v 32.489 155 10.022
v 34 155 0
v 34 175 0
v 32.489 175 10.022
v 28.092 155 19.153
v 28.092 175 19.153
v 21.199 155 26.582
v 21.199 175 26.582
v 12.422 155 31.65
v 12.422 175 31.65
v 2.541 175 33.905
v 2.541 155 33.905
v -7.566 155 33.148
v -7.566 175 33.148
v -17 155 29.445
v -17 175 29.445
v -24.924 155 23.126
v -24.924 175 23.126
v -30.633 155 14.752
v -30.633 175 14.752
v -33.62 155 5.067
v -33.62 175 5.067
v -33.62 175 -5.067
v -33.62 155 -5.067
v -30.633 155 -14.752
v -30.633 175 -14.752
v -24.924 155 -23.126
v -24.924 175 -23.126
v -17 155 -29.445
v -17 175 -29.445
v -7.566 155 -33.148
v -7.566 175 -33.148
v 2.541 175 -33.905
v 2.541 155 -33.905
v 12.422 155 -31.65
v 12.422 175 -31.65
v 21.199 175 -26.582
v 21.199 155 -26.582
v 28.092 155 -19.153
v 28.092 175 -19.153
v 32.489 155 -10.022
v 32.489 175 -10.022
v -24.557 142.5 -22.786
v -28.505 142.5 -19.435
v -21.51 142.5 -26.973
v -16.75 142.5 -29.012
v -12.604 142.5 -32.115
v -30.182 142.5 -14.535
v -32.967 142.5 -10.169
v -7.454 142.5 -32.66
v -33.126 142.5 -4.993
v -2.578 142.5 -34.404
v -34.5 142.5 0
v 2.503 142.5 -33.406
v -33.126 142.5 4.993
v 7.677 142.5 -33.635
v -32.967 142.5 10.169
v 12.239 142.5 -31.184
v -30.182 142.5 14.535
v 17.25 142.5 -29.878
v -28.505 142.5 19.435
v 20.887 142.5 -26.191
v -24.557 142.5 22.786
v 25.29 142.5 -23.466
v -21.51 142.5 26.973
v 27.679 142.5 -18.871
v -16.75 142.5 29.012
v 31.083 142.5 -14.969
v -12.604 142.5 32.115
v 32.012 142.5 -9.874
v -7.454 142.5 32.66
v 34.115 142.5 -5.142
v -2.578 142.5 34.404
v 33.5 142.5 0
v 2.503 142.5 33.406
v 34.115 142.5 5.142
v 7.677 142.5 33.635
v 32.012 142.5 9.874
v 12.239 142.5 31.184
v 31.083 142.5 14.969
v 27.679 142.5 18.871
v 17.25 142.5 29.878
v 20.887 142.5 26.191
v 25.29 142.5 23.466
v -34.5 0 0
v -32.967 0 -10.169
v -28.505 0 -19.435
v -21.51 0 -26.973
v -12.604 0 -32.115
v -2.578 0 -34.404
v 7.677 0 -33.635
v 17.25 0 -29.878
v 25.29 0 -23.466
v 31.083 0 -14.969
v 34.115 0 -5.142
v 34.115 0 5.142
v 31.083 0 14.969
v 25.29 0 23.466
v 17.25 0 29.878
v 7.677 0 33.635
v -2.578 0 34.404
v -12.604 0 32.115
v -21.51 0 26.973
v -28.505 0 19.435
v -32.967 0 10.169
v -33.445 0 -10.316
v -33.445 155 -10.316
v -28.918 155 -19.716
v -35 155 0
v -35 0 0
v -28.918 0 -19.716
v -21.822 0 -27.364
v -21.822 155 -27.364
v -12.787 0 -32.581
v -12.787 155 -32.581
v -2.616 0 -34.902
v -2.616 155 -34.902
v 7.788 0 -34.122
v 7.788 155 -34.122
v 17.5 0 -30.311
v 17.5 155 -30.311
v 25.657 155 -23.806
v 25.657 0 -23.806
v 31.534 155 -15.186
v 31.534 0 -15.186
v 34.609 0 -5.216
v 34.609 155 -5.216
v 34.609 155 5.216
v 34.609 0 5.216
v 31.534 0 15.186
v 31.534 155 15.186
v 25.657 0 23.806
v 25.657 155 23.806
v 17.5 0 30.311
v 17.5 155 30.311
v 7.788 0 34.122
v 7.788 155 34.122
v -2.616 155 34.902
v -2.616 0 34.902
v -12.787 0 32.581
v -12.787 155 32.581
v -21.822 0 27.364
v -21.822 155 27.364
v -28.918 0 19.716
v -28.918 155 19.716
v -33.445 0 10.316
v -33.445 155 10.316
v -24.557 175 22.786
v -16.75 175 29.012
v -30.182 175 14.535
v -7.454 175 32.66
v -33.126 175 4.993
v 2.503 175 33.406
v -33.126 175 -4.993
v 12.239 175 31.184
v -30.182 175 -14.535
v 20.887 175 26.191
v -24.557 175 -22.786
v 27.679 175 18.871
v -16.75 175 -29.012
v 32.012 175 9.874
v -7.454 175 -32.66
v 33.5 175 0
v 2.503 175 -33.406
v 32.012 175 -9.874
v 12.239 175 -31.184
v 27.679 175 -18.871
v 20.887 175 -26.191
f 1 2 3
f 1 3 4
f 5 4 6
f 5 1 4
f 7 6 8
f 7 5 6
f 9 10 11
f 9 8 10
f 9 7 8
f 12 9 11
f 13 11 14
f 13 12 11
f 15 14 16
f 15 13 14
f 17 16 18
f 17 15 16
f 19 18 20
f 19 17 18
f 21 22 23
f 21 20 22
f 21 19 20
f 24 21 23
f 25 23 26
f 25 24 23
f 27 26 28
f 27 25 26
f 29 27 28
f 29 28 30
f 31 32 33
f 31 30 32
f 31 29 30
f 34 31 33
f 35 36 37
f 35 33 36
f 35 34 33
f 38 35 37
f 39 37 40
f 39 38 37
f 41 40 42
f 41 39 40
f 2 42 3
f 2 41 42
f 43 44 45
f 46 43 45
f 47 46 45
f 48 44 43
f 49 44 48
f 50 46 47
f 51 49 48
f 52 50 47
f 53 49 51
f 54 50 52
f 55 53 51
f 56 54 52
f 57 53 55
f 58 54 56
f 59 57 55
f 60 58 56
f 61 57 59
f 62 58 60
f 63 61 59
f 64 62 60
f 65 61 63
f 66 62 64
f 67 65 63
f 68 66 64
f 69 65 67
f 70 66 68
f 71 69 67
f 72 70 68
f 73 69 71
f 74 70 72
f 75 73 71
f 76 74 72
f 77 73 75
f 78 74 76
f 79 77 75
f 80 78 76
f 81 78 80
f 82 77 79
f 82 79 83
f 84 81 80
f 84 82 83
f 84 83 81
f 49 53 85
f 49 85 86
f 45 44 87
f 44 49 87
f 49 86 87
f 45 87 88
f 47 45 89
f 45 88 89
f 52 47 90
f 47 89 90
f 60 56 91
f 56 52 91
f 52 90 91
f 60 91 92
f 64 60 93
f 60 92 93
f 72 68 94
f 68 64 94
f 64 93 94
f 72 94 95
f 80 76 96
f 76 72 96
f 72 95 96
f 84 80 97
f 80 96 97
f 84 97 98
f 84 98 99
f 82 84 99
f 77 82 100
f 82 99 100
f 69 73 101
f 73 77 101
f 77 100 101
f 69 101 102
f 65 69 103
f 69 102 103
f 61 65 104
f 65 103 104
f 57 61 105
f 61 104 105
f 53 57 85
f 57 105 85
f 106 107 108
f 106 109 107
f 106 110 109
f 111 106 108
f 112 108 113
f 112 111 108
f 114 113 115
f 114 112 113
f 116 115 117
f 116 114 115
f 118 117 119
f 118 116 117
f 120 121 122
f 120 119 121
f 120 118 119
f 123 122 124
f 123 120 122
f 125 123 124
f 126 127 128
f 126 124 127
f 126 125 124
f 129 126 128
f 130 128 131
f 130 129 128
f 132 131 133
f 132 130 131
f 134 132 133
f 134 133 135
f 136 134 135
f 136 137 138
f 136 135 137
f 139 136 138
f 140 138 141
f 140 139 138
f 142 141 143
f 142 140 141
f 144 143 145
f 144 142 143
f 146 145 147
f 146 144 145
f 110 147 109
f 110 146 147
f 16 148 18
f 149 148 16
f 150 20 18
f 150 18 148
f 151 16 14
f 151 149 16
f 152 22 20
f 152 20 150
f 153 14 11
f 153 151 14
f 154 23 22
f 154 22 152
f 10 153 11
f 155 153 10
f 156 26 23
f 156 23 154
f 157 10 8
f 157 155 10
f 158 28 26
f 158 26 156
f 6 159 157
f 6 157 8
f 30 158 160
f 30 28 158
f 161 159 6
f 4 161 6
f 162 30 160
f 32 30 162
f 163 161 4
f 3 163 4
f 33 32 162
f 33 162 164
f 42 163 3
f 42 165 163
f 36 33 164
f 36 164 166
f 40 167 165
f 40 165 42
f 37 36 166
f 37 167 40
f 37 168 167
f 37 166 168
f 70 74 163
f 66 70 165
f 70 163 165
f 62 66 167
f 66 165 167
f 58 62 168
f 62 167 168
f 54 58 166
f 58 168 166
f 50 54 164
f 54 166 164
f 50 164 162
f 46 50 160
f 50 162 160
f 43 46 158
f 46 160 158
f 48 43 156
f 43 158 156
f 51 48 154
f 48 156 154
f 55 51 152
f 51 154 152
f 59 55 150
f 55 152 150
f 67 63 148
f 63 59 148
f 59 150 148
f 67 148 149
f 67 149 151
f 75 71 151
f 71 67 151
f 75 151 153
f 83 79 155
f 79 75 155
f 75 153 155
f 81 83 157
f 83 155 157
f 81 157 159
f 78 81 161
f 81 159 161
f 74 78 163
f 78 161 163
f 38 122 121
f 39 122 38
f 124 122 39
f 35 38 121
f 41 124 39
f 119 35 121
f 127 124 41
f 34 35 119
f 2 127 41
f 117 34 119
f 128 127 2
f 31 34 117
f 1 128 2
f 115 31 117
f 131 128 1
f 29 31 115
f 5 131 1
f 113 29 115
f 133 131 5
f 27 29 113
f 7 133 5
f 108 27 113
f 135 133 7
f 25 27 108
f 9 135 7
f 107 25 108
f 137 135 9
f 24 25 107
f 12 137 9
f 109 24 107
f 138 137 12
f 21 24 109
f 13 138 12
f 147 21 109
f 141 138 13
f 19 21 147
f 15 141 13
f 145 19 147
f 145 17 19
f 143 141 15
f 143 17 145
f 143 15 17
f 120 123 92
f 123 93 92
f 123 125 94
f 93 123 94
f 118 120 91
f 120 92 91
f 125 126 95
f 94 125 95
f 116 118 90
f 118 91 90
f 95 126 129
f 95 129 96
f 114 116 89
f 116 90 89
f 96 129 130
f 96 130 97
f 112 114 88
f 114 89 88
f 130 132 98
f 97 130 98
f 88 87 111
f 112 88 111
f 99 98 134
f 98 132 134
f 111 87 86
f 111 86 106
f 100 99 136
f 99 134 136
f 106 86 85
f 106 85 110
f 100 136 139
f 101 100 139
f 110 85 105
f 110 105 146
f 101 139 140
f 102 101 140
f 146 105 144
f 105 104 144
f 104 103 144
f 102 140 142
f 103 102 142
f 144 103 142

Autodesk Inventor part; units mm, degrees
ref_plane "XZ Plane" through (0, 0, 0) normal (0, 1, 0) x (-1, 0, 0)
sketch "Sketch1" plane through (0, 0, 0) normal (0, 1, 0) x (-1, 0, 0)
  circle A0 centre (0, 0) radius 35
  circle A1 centre (0, 0) radius 34.5
  dimension "d0" = 70
  dimension "d1" = 69
extrude "Extrusion1" add sketch "Sketch1" along normal blind 155
ref_plane "Work Plane2" through (35, 0, 0) normal (1, 0, 0) x (0, 1, 0)
sketch "Sketch5" plane through (0, 155, 0) normal (0, 1, 0) x (1, 0, 0)
  circle A0 centre (0, 0) radius 34
  circle A1 centre (0, 0) radius 33.5
  dimension "d44" = 68
  dimension "d45" = 67
extrude "Extrusion3" add sketch "Sketch5" along normal blind 20
sketch "Sketch6" plane through (0, 155, 0) normal (0, -1, 0) x (1, 0, 0)
  circle A0 centre (0, 0) radius 33.5
  circle A1 centre (0, 0) radius 34.5 projected
  circle A2 centre (0, 0) radius 35
extrude "Extrusion4" add sketch "Sketch6" along normal blind 12.5 contours A1
ref_plane "Work Plane4" through (34, 0, 0) normal (1, 0, 0) x (0, 1, 0)
properties part number "Engine skin lower" material "Plastic, Opaque White"
